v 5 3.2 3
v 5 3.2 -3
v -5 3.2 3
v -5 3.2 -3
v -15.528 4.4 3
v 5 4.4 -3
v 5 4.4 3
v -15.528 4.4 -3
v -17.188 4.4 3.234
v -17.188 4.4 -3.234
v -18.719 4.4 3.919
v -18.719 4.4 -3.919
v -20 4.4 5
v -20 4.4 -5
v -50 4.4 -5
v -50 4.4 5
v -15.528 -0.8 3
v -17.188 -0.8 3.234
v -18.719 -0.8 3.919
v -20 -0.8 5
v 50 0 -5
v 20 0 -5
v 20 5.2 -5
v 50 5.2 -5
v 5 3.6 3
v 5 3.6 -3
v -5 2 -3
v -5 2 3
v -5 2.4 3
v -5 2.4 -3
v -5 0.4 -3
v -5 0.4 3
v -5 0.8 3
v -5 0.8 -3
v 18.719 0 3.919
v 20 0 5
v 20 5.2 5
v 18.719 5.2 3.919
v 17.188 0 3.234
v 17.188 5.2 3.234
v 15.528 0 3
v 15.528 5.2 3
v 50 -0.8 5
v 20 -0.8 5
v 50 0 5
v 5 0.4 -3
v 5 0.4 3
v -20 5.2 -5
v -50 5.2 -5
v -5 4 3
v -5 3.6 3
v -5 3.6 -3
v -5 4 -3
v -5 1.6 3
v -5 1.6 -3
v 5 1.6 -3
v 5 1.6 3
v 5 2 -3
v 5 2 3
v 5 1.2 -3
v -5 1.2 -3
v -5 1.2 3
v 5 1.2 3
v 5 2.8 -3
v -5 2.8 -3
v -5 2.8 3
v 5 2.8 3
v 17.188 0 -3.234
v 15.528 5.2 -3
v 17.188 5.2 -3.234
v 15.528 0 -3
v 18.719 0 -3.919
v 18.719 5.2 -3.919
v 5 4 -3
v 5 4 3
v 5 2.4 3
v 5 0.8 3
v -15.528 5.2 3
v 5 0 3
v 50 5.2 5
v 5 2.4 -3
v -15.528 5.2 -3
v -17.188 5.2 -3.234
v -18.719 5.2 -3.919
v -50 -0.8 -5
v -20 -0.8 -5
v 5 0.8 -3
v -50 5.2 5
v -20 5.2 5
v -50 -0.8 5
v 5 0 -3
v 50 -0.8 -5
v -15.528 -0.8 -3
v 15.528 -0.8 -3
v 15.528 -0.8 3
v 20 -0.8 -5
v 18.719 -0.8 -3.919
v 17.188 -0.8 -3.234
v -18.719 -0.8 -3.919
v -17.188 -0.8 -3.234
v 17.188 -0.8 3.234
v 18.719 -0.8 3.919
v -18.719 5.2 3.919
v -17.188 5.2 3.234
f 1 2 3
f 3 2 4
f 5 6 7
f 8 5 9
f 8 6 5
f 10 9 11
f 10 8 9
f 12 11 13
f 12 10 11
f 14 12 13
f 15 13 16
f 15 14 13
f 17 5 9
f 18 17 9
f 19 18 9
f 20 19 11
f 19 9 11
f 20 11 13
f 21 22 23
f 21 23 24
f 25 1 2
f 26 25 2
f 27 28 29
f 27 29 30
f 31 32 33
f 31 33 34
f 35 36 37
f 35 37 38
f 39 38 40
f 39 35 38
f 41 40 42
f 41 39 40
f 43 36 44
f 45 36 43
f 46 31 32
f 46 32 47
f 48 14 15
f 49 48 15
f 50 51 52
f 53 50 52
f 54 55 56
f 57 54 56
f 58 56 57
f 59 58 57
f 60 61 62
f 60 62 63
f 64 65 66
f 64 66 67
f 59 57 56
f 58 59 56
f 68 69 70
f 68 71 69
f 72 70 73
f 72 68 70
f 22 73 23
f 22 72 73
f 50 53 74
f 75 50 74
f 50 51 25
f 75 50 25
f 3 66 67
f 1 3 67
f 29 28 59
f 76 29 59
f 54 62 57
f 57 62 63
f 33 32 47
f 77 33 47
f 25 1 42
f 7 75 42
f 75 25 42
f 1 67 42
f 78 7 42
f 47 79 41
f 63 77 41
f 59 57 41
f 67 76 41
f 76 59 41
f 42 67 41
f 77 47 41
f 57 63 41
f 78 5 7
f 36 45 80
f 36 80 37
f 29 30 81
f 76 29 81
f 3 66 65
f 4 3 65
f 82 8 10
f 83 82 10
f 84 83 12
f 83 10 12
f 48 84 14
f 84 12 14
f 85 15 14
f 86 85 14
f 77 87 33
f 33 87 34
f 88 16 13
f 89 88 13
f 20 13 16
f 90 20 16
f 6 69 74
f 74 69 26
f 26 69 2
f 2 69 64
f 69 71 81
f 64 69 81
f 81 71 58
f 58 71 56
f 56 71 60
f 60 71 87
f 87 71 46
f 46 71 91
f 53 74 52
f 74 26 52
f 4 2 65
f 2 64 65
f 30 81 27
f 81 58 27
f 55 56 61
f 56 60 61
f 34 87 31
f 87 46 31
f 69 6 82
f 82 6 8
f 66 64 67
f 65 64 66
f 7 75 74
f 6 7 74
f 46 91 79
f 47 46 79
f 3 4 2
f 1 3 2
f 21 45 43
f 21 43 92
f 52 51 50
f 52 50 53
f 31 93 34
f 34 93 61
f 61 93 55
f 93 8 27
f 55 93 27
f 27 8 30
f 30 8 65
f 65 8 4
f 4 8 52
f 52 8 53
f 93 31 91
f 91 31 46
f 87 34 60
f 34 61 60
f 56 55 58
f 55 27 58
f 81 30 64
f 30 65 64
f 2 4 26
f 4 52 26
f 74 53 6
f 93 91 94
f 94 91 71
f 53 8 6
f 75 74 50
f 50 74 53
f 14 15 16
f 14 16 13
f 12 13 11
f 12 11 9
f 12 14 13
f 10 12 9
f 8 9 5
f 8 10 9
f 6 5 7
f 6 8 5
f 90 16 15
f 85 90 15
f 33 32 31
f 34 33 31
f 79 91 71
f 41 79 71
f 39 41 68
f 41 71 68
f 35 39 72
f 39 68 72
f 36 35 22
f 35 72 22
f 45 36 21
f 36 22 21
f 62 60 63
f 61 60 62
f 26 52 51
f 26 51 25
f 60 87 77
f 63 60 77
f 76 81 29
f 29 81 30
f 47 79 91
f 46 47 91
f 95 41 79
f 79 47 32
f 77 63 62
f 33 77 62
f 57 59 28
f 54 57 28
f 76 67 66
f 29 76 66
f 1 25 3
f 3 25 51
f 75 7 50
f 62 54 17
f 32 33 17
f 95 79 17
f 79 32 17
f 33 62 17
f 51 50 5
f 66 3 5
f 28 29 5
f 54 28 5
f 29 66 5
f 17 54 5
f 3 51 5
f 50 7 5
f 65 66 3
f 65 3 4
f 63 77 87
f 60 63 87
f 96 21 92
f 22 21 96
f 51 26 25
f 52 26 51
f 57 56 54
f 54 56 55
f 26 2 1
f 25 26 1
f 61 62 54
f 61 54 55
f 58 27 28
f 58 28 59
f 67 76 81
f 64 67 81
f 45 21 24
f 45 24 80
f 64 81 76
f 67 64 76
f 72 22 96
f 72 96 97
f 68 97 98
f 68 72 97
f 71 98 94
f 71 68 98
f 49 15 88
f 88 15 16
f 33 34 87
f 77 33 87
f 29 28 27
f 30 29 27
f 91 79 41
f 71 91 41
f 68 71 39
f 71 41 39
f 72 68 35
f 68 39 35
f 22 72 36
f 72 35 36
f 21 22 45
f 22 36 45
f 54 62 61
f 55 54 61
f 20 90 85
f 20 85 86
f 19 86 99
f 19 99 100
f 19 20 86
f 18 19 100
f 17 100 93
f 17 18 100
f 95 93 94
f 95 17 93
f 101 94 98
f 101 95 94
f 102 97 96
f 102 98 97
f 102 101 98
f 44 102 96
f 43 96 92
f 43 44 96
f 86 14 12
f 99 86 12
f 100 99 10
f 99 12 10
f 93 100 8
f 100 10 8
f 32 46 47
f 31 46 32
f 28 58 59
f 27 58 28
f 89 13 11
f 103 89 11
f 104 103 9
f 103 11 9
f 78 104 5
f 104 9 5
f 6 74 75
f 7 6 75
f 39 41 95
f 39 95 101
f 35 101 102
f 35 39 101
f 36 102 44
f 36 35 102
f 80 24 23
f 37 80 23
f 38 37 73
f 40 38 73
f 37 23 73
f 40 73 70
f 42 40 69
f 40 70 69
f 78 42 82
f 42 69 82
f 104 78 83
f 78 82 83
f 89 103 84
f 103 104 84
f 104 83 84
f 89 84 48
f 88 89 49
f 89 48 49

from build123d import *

# Parameters (mm, degrees)
SKETCH1_W            = 5
SKETCH1_H            = 6
BOSS_EXTRUDE7_DEPTH  = 0.4
BOSS_EXTRUDE8_DEPTH  = 0.4
SKETCH4_W            = 5
SKETCH4_H            = 6
BOSS_EXTRUDE9_DEPTH  = 0.4
BOSS_EXTRUDE10_DEPTH = 0.4
LPATTERN2_COUNT      = 25
LPATTERN2_PITCH      = 0.8
LPATTERN3_COUNT      = 25
LPATTERN3_PITCH      = 0.8
BOSS_EXTRUDE11_DEPTH = 0.8
CUT_EXTRUDE1_DEPTH   = 15.6
BOSS_EXTRUDE12_DEPTH = 0.8


with BuildPart() as part:
    # Sketch1 → Boss-Extrude7 (new body)
    with BuildSketch(Plane(origin=(0, 0, 0), x_dir=(1, 0, 0), z_dir=(0, 1, 0))):
        with BuildLine():
            Line((-5, -3), (-5, 3))
            Line((-5, 3), (-15.527864045, 3))
            ThreePointArc((-15.527864045, 3), (-17.977353788, 3.522774425), (-20, 5))
            Line((-20, 5), (-50, 5))
            Line((-50, 5), (-50, -5))
            Line((-50, -5), (-20, -5))
            ThreePointArc((-20, -5), (-17.977353788, -3.522774425), (-15.527864045, -3))
            Line((-15.527864045, -3), (-5, -3))
        make_face()
        with Locations((-2.5, 0)):
            Rectangle(SKETCH1_W, SKETCH1_H)
        with Locations((2.5, 0)):
            Rectangle(SKETCH1_W, SKETCH1_H)
    extrude(amount=BOSS_EXTRUDE7_DEPTH)

    # Sketch4<3> → Boss-Extrude10 (add)
    with BuildSketch(Plane(origin=(0, 0.4, 0), x_dir=(1, 0, 0), z_dir=(0, 1, 0))):
        with BuildLine():
            Line((-5, -3), (-5, 3))
            Line((-5, 3), (-15.527864045, 3))
            ThreePointArc((-15.527864045, 3), (-17.977353788, 3.522774425), (-20, 5))
            Line((-20, 5), (-50, 5))
            Line((-50, 5), (-50, -5))
            Line((-50, -5), (-20, -5))
            ThreePointArc((-20, -5), (-17.977353788, -3.522774425), (-15.527864045, -3))
            Line((-15.527864045, -3), (-5, -3))
        make_face()
    extrude(amount=BOSS_EXTRUDE10_DEPTH)


with BuildPart() as body_2:
    # Sketch1<3> → Boss-Extrude8 (new body)
    with BuildSketch(Plane(origin=(0, 0, 0), x_dir=(1, 0, 0), z_dir=(0, 1, 0))):
        with BuildLine():
            ThreePointArc((20, 5), (17.977353788, 3.522774425), (15.527864045, 3))
            Line((15.527864045, 3), (5, 3))
            Line((5, 3), (5, -3))
            Line((5, -3), (15.527864045, -3))
            ThreePointArc((15.527864045, -3), (17.977353788, -3.522774425), (20, -5))
            Line((20, -5), (50, -5))
            Line((50, -5), (50, 5))
            Line((50, 5), (20, 5))
        make_face()
    extrude(amount=BOSS_EXTRUDE8_DEPTH)

    # Sketch4 → Boss-Extrude9 (add)
    with BuildSketch(Plane(origin=(0, 0.4, 0), x_dir=(1, 0, 0), z_dir=(0, 1, 0))):
        with BuildLine():
            ThreePointArc((20, -5), (17.977353788, -3.522774425), (15.527864045, -3))
            Line((15.527864045, -3), (5, -3))
            Line((5, -3), (5, 3))
            Line((5, 3), (15.527864045, 3))
            ThreePointArc((15.527864045, 3), (17.977353788, 3.522774425), (20, 5))
            Line((20, 5), (50, 5))
            Line((50, 5), (50, -5))
            Line((50, -5), (20, -5))
        make_face()
        with Locations((2.5, 0)):
            Rectangle(SKETCH4_W, SKETCH4_H)
        with Locations((-2.5, 0)):
            Rectangle(SKETCH4_W, SKETCH4_H)
    extrude(amount=BOSS_EXTRUDE9_DEPTH)


with BuildPart() as lpattern2_1:
    # LPattern2: pattern copy
    add(part.part.moved(Location(Vector(0, 1, 0) * (1 * LPATTERN2_PITCH))))


with BuildPart() as lpattern2_2:
    # LPattern2: pattern copy
    add(part.part.moved(Location(Vector(0, 1, 0) * (2 * LPATTERN2_PITCH))))


with BuildPart() as lpattern2_3:
    # LPattern2: pattern copy
    add(part.part.moved(Location(Vector(0, 1, 0) * (3 * LPATTERN2_PITCH))))


with BuildPart() as lpattern2_4:
    # LPattern2: pattern copy
    add(part.part.moved(Location(Vector(0, 1, 0) * (4 * LPATTERN2_PITCH))))


with BuildPart() as lpattern2_5:
    # LPattern2: pattern copy
    add(part.part.moved(Location(Vector(0, 1, 0) * (5 * LPATTERN2_PITCH))))


with BuildPart() as lpattern2_6:
    # LPattern2: pattern copy
    add(part.part.moved(Location(Vector(0, 1, 0) * (6 * LPATTERN2_PITCH))))


with BuildPart() as lpattern2_7:
    # LPattern2: pattern copy
    add(part.part.moved(Location(Vector(0, 1, 0) * (7 * LPATTERN2_PITCH))))


with BuildPart() as lpattern2_8:
    # LPattern2: pattern copy
    add(part.part.moved(Location(Vector(0, 1, 0) * (8 * LPATTERN2_PITCH))))


with BuildPart() as lpattern2_9:
    # LPattern2: pattern copy
    add(part.part.moved(Location(Vector(0, 1, 0) * (9 * LPATTERN2_PITCH))))


with BuildPart() as lpattern2_10:
    # LPattern2: pattern copy
    add(part.part.moved(Location(Vector(0, 1, 0) * (10 * LPATTERN2_PITCH))))


with BuildPart() as lpattern2_11:
    # LPattern2: pattern copy
    add(part.part.moved(Location(Vector(0, 1, 0) * (11 * LPATTERN2_PITCH))))


with BuildPart() as lpattern2_12:
    # LPattern2: pattern copy
    add(part.part.moved(Location(Vector(0, 1, 0) * (12 * LPATTERN2_PITCH))))


with BuildPart() as lpattern2_13:
    # LPattern2: pattern copy
    add(part.part.moved(Location(Vector(0, 1, 0) * (13 * LPATTERN2_PITCH))))


with BuildPart() as lpattern2_14:
    # LPattern2: pattern copy
    add(part.part.moved(Location(Vector(0, 1, 0) * (14 * LPATTERN2_PITCH))))


with BuildPart() as lpattern2_15:
    # LPattern2: pattern copy
    add(part.part.moved(Location(Vector(0, 1, 0) * (15 * LPATTERN2_PITCH))))


with BuildPart() as lpattern2_16:
    # LPattern2: pattern copy
    add(part.part.moved(Location(Vector(0, 1, 0) * (16 * LPATTERN2_PITCH))))


with BuildPart() as lpattern2_17:
    # LPattern2: pattern copy
    add(part.part.moved(Location(Vector(0, 1, 0) * (17 * LPATTERN2_PITCH))))


with BuildPart() as lpattern2_18:
    # LPattern2: pattern copy
    add(part.part.moved(Location(Vector(0, 1, 0) * (18 * LPATTERN2_PITCH))))


with BuildPart() as lpattern2_19:
    # LPattern2: pattern copy
    add(part.part.moved(Location(Vector(0, 1, 0) * (19 * LPATTERN2_PITCH))))


with BuildPart() as lpattern2_20:
    # LPattern2: pattern copy
    add(part.part.moved(Location(Vector(0, 1, 0) * (20 * LPATTERN2_PITCH))))


with BuildPart() as lpattern2_21:
    # LPattern2: pattern copy
    add(part.part.moved(Location(Vector(0, 1, 0) * (21 * LPATTERN2_PITCH))))


with BuildPart() as lpattern2_22:
    # LPattern2: pattern copy
    add(part.part.moved(Location(Vector(0, 1, 0) * (22 * LPATTERN2_PITCH))))


with BuildPart() as lpattern2_23:
    # LPattern2: pattern copy
    add(part.part.moved(Location(Vector(0, 1, 0) * (23 * LPATTERN2_PITCH))))


with BuildPart() as lpattern2_24:
    # LPattern2: pattern copy
    add(part.part.moved(Location(Vector(0, 1, 0) * (24 * LPATTERN2_PITCH))))


with BuildPart() as lpattern2_23_1:
    add(lpattern2_23.part)

    # Combine1: union LPattern2_22, LPattern2_21, LPattern2_20, LPattern2_19, LPattern2_18, LPattern2_17, LPattern2_16, LPattern2_15, LPattern2_14, LPattern2_13, LPattern2_12, LPattern2_11, LPattern2_10, LPattern2_9, LPattern2_8, LPattern2_7, LPattern2_6, LPattern2_5, LPattern2_4, LPattern2_3, LPattern2_2, LPattern2_1, part, LPattern2_24
    add(lpattern2_22.part)
    add(lpattern2_21.part)
    add(lpattern2_20.part)
    add(lpattern2_19.part)
    add(lpattern2_18.part)
    add(lpattern2_17.part)
    add(lpattern2_16.part)
    add(lpattern2_15.part)
    add(lpattern2_14.part)
    add(lpattern2_13.part)
    add(lpattern2_12.part)
    add(lpattern2_11.part)
    add(lpattern2_10.part)
    add(lpattern2_9.part)
    add(lpattern2_8.part)
    add(lpattern2_7.part)
    add(lpattern2_6.part)
    add(lpattern2_5.part)
    add(lpattern2_4.part)
    add(lpattern2_3.part)
    add(lpattern2_2.part)
    add(lpattern2_1.part)
    add(part.part)
    add(lpattern2_24.part)

    # Sketch5 → Boss-Extrude11 (add)
    with BuildSketch(Plane.XZ):
        with BuildLine():
            ThreePointArc((-20, -5), (-17.977353788, -3.522774425), (-15.527864045, -3))
            Line((-15.527864045, -3), (5, -3))
            Line((5, -3), (5, 3))
            Line((5, 3), (-15.527864045, 3))
            ThreePointArc((-15.527864045, 3), (-17.977353788, 3.522774425), (-20, 5))
            Line((-20, 5), (-50, 5))
            Line((-50, 5), (-50, -5))
            Line((-50, -5), (-20, -5))
        make_face()
        with BuildLine():
            ThreePointArc((15.527864045, 3), (17.977353788, 3.522774425), (20, 5))
            Line((20, 5), (50, 5))
            Line((50, 5), (50, -5))
            Line((50, -5), (20, -5))
            ThreePointArc((20, -5), (17.977353788, -3.522774425), (15.527864045, -3))
            Line((15.527864045, -3), (5, -3))
            Line((5, -3), (5, 3))
            Line((5, 3), (15.527864045, 3))
        make_face()
    extrude(amount=BOSS_EXTRUDE11_DEPTH)


with BuildPart() as lpattern3_1:
    # LPattern3: pattern copy
    add(body_2.part.moved(Location(Vector(0, 1, 0) * (1 * LPATTERN3_PITCH))))


with BuildPart() as lpattern3_2:
    # LPattern3: pattern copy
    add(body_2.part.moved(Location(Vector(0, 1, 0) * (2 * LPATTERN3_PITCH))))


with BuildPart() as lpattern3_3:
    # LPattern3: pattern copy
    add(body_2.part.moved(Location(Vector(0, 1, 0) * (3 * LPATTERN3_PITCH))))


with BuildPart() as lpattern3_4:
    # LPattern3: pattern copy
    add(body_2.part.moved(Location(Vector(0, 1, 0) * (4 * LPATTERN3_PITCH))))


with BuildPart() as lpattern3_5:
    # LPattern3: pattern copy
    add(body_2.part.moved(Location(Vector(0, 1, 0) * (5 * LPATTERN3_PITCH))))


with BuildPart() as lpattern3_6:
    # LPattern3: pattern copy
    add(body_2.part.moved(Location(Vector(0, 1, 0) * (6 * LPATTERN3_PITCH))))


with BuildPart() as lpattern3_7:
    # LPattern3: pattern copy
    add(body_2.part.moved(Location(Vector(0, 1, 0) * (7 * LPATTERN3_PITCH))))


with BuildPart() as lpattern3_8:
    # LPattern3: pattern copy
    add(body_2.part.moved(Location(Vector(0, 1, 0) * (8 * LPATTERN3_PITCH))))


with BuildPart() as lpattern3_9:
    # LPattern3: pattern copy
    add(body_2.part.moved(Location(Vector(0, 1, 0) * (9 * LPATTERN3_PITCH))))


with BuildPart() as lpattern3_10:
    # LPattern3: pattern copy
    add(body_2.part.moved(Location(Vector(0, 1, 0) * (10 * LPATTERN3_PITCH))))


with BuildPart() as lpattern3_11:
    # LPattern3: pattern copy
    add(body_2.part.moved(Location(Vector(0, 1, 0) * (11 * LPATTERN3_PITCH))))


with BuildPart() as lpattern3_12:
    # LPattern3: pattern copy
    add(body_2.part.moved(Location(Vector(0, 1, 0) * (12 * LPATTERN3_PITCH))))


with BuildPart() as lpattern3_13:
    # LPattern3: pattern copy
    add(body_2.part.moved(Location(Vector(0, 1, 0) * (13 * LPATTERN3_PITCH))))


with BuildPart() as lpattern3_14:
    # LPattern3: pattern copy
    add(body_2.part.moved(Location(Vector(0, 1, 0) * (14 * LPATTERN3_PITCH))))


with BuildPart() as lpattern3_15:
    # LPattern3: pattern copy
    add(body_2.part.moved(Location(Vector(0, 1, 0) * (15 * LPATTERN3_PITCH))))


with BuildPart() as lpattern3_16:
    # LPattern3: pattern copy
    add(body_2.part.moved(Location(Vector(0, 1, 0) * (16 * LPATTERN3_PITCH))))


with BuildPart() as lpattern3_17:
    # LPattern3: pattern copy
    add(body_2.part.moved(Location(Vector(0, 1, 0) * (17 * LPATTERN3_PITCH))))


with BuildPart() as lpattern3_18:
    # LPattern3: pattern copy
    add(body_2.part.moved(Location(Vector(0, 1, 0) * (18 * LPATTERN3_PITCH))))


with BuildPart() as lpattern3_19:
    # LPattern3: pattern copy
    add(body_2.part.moved(Location(Vector(0, 1, 0) * (19 * LPATTERN3_PITCH))))


with BuildPart() as lpattern3_20:
    # LPattern3: pattern copy
    add(body_2.part.moved(Location(Vector(0, 1, 0) * (20 * LPATTERN3_PITCH))))


with BuildPart() as lpattern3_21:
    # LPattern3: pattern copy
    add(body_2.part.moved(Location(Vector(0, 1, 0) * (21 * LPATTERN3_PITCH))))


with BuildPart() as lpattern3_22:
    # LPattern3: pattern copy
    add(body_2.part.moved(Location(Vector(0, 1, 0) * (22 * LPATTERN3_PITCH))))


with BuildPart() as lpattern3_23:
    # LPattern3: pattern copy
    add(body_2.part.moved(Location(Vector(0, 1, 0) * (23 * LPATTERN3_PITCH))))


with BuildPart() as lpattern3_24:
    # LPattern3: pattern copy
    add(body_2.part.moved(Location(Vector(0, 1, 0) * (24 * LPATTERN3_PITCH))))


with BuildPart() as lpattern3_20_1:
    add(lpattern3_20.part)

    # Combine3: read off the stored shape, not the designer's step
    # Combine3: union body 2, LPattern3_2, LPattern3_3, LPattern3_4, LPattern3_5, LPattern3_6, LPattern3_7, LPattern3_8, LPattern3_9, LPattern3_10, LPattern3_11, LPattern3_12, LPattern3_13, LPattern3_14, LPattern3_15, LPattern3_16, LPattern3_17, LPattern3_18, LPattern3_19, LPattern3_21, LPattern3_22, LPattern3_23, LPattern3_24, LPattern3_1
    add(body_2.part)
    add(lpattern3_2.part)
    add(lpattern3_3.part)
    add(lpattern3_4.part)
    add(lpattern3_5.part)
    add(lpattern3_6.part)
    add(lpattern3_7.part)
    add(lpattern3_8.part)
    add(lpattern3_9.part)
    add(lpattern3_10.part)
    add(lpattern3_11.part)
    add(lpattern3_12.part)
    add(lpattern3_13.part)
    add(lpattern3_14.part)
    add(lpattern3_15.part)
    add(lpattern3_16.part)
    add(lpattern3_17.part)
    add(lpattern3_18.part)
    add(lpattern3_19.part)
    add(lpattern3_21.part)
    add(lpattern3_22.part)
    add(lpattern3_23.part)
    add(lpattern3_24.part)
    add(lpattern3_1.part)


with BuildPart() as cut_extrude1_tool:
    # Sketch6 → Cut-Extrude1 (new body)
    with BuildSketch(Plane(origin=(0, 20, 0), x_dir=(1, 0, 0), z_dir=(0, 1, 0))):
        with BuildLine():
            Line((-15.527864045, -3), (-5, -3))
            Line((-5, -3), (-5, 3))
            Line((-5, 3), (-15.527864045, 3))
            ThreePointArc((-15.527864045, 3), (-17.977353788, 3.522774425), (-20, 5))
            Line((-20, 5), (-50, 5))
            Line((-50, 5), (-50, -5))
            Line((-50, -5), (-20, -5))
            ThreePointArc((-20, -5), (-17.977353788, -3.522774425), (-15.527864045, -3))
        make_face()
        with BuildLine():
            ThreePointArc((15.527864045, 3), (17.977353788, 3.522774425), (20, 5))
            Line((20, 5), (50, 5))
            Line((50, 5), (50, -5))
            Line((50, -5), (20, -5))
            ThreePointArc((20, -5), (17.977353788, -3.522774425), (15.527864045, -3))
            Line((15.527864045, -3), (-5, -3))
            Line((-5, -3), (-5, 3))
            Line((-5, 3), (15.527864045, 3))
        make_face()
    extrude(amount=-CUT_EXTRUDE1_DEPTH)


with BuildPart() as lpattern2_23_2:
    add(lpattern2_23_1.part)

    # Cut-Extrude1: cut by cut_extrude1_tool
    add(cut_extrude1_tool.part, mode=Mode.SUBTRACT)


with BuildPart() as lpattern3_20_2:
    add(lpattern3_20_1.part)

    # Cut-Extrude1: cut by cut_extrude1_tool
    add(cut_extrude1_tool.part, mode=Mode.SUBTRACT)

    # Sketch7 → Boss-Extrude12 (add)
    with BuildSketch(Plane(origin=(0, 4.4, 0), x_dir=(1, 0, 0), z_dir=(0, 1, 0))):
        with BuildLine():
            ThreePointArc((15.527864045, 3), (17.977353788, 3.522774425), (20, 5))
            Line((20, 5), (50, 5))
            Line((50, 5), (50, -5))
            Line((50, -5), (20, -5))
            ThreePointArc((20, -5), (17.977353788, -3.522774425), (15.527864045, -3))
            Line((15.527864045, -3), (5, -3))
            Line((5, -3), (5, 3))
            Line((5, 3), (15.527864045, 3))
        make_face()
        with BuildLine():
            Line((5, -3), (5, 3))
            Line((5, 3), (-15.527864045, 3))
            ThreePointArc((-15.527864045, 3), (-17.977353788, 3.522774425), (-20, 5))
            Line((-20, 5), (-50, 5))
            Line((-50, 5), (-50, -5))
            Line((-50, -5), (-20, -5))
            ThreePointArc((-20, -5), (-17.977353788, -3.522774425), (-15.527864045, -3))
            Line((-15.527864045, -3), (5, -3))
        make_face()
    extrude(amount=BOSS_EXTRUDE12_DEPTH)


solid = Compound([lpattern2_23_2.part, lpattern3_20_2.part])
